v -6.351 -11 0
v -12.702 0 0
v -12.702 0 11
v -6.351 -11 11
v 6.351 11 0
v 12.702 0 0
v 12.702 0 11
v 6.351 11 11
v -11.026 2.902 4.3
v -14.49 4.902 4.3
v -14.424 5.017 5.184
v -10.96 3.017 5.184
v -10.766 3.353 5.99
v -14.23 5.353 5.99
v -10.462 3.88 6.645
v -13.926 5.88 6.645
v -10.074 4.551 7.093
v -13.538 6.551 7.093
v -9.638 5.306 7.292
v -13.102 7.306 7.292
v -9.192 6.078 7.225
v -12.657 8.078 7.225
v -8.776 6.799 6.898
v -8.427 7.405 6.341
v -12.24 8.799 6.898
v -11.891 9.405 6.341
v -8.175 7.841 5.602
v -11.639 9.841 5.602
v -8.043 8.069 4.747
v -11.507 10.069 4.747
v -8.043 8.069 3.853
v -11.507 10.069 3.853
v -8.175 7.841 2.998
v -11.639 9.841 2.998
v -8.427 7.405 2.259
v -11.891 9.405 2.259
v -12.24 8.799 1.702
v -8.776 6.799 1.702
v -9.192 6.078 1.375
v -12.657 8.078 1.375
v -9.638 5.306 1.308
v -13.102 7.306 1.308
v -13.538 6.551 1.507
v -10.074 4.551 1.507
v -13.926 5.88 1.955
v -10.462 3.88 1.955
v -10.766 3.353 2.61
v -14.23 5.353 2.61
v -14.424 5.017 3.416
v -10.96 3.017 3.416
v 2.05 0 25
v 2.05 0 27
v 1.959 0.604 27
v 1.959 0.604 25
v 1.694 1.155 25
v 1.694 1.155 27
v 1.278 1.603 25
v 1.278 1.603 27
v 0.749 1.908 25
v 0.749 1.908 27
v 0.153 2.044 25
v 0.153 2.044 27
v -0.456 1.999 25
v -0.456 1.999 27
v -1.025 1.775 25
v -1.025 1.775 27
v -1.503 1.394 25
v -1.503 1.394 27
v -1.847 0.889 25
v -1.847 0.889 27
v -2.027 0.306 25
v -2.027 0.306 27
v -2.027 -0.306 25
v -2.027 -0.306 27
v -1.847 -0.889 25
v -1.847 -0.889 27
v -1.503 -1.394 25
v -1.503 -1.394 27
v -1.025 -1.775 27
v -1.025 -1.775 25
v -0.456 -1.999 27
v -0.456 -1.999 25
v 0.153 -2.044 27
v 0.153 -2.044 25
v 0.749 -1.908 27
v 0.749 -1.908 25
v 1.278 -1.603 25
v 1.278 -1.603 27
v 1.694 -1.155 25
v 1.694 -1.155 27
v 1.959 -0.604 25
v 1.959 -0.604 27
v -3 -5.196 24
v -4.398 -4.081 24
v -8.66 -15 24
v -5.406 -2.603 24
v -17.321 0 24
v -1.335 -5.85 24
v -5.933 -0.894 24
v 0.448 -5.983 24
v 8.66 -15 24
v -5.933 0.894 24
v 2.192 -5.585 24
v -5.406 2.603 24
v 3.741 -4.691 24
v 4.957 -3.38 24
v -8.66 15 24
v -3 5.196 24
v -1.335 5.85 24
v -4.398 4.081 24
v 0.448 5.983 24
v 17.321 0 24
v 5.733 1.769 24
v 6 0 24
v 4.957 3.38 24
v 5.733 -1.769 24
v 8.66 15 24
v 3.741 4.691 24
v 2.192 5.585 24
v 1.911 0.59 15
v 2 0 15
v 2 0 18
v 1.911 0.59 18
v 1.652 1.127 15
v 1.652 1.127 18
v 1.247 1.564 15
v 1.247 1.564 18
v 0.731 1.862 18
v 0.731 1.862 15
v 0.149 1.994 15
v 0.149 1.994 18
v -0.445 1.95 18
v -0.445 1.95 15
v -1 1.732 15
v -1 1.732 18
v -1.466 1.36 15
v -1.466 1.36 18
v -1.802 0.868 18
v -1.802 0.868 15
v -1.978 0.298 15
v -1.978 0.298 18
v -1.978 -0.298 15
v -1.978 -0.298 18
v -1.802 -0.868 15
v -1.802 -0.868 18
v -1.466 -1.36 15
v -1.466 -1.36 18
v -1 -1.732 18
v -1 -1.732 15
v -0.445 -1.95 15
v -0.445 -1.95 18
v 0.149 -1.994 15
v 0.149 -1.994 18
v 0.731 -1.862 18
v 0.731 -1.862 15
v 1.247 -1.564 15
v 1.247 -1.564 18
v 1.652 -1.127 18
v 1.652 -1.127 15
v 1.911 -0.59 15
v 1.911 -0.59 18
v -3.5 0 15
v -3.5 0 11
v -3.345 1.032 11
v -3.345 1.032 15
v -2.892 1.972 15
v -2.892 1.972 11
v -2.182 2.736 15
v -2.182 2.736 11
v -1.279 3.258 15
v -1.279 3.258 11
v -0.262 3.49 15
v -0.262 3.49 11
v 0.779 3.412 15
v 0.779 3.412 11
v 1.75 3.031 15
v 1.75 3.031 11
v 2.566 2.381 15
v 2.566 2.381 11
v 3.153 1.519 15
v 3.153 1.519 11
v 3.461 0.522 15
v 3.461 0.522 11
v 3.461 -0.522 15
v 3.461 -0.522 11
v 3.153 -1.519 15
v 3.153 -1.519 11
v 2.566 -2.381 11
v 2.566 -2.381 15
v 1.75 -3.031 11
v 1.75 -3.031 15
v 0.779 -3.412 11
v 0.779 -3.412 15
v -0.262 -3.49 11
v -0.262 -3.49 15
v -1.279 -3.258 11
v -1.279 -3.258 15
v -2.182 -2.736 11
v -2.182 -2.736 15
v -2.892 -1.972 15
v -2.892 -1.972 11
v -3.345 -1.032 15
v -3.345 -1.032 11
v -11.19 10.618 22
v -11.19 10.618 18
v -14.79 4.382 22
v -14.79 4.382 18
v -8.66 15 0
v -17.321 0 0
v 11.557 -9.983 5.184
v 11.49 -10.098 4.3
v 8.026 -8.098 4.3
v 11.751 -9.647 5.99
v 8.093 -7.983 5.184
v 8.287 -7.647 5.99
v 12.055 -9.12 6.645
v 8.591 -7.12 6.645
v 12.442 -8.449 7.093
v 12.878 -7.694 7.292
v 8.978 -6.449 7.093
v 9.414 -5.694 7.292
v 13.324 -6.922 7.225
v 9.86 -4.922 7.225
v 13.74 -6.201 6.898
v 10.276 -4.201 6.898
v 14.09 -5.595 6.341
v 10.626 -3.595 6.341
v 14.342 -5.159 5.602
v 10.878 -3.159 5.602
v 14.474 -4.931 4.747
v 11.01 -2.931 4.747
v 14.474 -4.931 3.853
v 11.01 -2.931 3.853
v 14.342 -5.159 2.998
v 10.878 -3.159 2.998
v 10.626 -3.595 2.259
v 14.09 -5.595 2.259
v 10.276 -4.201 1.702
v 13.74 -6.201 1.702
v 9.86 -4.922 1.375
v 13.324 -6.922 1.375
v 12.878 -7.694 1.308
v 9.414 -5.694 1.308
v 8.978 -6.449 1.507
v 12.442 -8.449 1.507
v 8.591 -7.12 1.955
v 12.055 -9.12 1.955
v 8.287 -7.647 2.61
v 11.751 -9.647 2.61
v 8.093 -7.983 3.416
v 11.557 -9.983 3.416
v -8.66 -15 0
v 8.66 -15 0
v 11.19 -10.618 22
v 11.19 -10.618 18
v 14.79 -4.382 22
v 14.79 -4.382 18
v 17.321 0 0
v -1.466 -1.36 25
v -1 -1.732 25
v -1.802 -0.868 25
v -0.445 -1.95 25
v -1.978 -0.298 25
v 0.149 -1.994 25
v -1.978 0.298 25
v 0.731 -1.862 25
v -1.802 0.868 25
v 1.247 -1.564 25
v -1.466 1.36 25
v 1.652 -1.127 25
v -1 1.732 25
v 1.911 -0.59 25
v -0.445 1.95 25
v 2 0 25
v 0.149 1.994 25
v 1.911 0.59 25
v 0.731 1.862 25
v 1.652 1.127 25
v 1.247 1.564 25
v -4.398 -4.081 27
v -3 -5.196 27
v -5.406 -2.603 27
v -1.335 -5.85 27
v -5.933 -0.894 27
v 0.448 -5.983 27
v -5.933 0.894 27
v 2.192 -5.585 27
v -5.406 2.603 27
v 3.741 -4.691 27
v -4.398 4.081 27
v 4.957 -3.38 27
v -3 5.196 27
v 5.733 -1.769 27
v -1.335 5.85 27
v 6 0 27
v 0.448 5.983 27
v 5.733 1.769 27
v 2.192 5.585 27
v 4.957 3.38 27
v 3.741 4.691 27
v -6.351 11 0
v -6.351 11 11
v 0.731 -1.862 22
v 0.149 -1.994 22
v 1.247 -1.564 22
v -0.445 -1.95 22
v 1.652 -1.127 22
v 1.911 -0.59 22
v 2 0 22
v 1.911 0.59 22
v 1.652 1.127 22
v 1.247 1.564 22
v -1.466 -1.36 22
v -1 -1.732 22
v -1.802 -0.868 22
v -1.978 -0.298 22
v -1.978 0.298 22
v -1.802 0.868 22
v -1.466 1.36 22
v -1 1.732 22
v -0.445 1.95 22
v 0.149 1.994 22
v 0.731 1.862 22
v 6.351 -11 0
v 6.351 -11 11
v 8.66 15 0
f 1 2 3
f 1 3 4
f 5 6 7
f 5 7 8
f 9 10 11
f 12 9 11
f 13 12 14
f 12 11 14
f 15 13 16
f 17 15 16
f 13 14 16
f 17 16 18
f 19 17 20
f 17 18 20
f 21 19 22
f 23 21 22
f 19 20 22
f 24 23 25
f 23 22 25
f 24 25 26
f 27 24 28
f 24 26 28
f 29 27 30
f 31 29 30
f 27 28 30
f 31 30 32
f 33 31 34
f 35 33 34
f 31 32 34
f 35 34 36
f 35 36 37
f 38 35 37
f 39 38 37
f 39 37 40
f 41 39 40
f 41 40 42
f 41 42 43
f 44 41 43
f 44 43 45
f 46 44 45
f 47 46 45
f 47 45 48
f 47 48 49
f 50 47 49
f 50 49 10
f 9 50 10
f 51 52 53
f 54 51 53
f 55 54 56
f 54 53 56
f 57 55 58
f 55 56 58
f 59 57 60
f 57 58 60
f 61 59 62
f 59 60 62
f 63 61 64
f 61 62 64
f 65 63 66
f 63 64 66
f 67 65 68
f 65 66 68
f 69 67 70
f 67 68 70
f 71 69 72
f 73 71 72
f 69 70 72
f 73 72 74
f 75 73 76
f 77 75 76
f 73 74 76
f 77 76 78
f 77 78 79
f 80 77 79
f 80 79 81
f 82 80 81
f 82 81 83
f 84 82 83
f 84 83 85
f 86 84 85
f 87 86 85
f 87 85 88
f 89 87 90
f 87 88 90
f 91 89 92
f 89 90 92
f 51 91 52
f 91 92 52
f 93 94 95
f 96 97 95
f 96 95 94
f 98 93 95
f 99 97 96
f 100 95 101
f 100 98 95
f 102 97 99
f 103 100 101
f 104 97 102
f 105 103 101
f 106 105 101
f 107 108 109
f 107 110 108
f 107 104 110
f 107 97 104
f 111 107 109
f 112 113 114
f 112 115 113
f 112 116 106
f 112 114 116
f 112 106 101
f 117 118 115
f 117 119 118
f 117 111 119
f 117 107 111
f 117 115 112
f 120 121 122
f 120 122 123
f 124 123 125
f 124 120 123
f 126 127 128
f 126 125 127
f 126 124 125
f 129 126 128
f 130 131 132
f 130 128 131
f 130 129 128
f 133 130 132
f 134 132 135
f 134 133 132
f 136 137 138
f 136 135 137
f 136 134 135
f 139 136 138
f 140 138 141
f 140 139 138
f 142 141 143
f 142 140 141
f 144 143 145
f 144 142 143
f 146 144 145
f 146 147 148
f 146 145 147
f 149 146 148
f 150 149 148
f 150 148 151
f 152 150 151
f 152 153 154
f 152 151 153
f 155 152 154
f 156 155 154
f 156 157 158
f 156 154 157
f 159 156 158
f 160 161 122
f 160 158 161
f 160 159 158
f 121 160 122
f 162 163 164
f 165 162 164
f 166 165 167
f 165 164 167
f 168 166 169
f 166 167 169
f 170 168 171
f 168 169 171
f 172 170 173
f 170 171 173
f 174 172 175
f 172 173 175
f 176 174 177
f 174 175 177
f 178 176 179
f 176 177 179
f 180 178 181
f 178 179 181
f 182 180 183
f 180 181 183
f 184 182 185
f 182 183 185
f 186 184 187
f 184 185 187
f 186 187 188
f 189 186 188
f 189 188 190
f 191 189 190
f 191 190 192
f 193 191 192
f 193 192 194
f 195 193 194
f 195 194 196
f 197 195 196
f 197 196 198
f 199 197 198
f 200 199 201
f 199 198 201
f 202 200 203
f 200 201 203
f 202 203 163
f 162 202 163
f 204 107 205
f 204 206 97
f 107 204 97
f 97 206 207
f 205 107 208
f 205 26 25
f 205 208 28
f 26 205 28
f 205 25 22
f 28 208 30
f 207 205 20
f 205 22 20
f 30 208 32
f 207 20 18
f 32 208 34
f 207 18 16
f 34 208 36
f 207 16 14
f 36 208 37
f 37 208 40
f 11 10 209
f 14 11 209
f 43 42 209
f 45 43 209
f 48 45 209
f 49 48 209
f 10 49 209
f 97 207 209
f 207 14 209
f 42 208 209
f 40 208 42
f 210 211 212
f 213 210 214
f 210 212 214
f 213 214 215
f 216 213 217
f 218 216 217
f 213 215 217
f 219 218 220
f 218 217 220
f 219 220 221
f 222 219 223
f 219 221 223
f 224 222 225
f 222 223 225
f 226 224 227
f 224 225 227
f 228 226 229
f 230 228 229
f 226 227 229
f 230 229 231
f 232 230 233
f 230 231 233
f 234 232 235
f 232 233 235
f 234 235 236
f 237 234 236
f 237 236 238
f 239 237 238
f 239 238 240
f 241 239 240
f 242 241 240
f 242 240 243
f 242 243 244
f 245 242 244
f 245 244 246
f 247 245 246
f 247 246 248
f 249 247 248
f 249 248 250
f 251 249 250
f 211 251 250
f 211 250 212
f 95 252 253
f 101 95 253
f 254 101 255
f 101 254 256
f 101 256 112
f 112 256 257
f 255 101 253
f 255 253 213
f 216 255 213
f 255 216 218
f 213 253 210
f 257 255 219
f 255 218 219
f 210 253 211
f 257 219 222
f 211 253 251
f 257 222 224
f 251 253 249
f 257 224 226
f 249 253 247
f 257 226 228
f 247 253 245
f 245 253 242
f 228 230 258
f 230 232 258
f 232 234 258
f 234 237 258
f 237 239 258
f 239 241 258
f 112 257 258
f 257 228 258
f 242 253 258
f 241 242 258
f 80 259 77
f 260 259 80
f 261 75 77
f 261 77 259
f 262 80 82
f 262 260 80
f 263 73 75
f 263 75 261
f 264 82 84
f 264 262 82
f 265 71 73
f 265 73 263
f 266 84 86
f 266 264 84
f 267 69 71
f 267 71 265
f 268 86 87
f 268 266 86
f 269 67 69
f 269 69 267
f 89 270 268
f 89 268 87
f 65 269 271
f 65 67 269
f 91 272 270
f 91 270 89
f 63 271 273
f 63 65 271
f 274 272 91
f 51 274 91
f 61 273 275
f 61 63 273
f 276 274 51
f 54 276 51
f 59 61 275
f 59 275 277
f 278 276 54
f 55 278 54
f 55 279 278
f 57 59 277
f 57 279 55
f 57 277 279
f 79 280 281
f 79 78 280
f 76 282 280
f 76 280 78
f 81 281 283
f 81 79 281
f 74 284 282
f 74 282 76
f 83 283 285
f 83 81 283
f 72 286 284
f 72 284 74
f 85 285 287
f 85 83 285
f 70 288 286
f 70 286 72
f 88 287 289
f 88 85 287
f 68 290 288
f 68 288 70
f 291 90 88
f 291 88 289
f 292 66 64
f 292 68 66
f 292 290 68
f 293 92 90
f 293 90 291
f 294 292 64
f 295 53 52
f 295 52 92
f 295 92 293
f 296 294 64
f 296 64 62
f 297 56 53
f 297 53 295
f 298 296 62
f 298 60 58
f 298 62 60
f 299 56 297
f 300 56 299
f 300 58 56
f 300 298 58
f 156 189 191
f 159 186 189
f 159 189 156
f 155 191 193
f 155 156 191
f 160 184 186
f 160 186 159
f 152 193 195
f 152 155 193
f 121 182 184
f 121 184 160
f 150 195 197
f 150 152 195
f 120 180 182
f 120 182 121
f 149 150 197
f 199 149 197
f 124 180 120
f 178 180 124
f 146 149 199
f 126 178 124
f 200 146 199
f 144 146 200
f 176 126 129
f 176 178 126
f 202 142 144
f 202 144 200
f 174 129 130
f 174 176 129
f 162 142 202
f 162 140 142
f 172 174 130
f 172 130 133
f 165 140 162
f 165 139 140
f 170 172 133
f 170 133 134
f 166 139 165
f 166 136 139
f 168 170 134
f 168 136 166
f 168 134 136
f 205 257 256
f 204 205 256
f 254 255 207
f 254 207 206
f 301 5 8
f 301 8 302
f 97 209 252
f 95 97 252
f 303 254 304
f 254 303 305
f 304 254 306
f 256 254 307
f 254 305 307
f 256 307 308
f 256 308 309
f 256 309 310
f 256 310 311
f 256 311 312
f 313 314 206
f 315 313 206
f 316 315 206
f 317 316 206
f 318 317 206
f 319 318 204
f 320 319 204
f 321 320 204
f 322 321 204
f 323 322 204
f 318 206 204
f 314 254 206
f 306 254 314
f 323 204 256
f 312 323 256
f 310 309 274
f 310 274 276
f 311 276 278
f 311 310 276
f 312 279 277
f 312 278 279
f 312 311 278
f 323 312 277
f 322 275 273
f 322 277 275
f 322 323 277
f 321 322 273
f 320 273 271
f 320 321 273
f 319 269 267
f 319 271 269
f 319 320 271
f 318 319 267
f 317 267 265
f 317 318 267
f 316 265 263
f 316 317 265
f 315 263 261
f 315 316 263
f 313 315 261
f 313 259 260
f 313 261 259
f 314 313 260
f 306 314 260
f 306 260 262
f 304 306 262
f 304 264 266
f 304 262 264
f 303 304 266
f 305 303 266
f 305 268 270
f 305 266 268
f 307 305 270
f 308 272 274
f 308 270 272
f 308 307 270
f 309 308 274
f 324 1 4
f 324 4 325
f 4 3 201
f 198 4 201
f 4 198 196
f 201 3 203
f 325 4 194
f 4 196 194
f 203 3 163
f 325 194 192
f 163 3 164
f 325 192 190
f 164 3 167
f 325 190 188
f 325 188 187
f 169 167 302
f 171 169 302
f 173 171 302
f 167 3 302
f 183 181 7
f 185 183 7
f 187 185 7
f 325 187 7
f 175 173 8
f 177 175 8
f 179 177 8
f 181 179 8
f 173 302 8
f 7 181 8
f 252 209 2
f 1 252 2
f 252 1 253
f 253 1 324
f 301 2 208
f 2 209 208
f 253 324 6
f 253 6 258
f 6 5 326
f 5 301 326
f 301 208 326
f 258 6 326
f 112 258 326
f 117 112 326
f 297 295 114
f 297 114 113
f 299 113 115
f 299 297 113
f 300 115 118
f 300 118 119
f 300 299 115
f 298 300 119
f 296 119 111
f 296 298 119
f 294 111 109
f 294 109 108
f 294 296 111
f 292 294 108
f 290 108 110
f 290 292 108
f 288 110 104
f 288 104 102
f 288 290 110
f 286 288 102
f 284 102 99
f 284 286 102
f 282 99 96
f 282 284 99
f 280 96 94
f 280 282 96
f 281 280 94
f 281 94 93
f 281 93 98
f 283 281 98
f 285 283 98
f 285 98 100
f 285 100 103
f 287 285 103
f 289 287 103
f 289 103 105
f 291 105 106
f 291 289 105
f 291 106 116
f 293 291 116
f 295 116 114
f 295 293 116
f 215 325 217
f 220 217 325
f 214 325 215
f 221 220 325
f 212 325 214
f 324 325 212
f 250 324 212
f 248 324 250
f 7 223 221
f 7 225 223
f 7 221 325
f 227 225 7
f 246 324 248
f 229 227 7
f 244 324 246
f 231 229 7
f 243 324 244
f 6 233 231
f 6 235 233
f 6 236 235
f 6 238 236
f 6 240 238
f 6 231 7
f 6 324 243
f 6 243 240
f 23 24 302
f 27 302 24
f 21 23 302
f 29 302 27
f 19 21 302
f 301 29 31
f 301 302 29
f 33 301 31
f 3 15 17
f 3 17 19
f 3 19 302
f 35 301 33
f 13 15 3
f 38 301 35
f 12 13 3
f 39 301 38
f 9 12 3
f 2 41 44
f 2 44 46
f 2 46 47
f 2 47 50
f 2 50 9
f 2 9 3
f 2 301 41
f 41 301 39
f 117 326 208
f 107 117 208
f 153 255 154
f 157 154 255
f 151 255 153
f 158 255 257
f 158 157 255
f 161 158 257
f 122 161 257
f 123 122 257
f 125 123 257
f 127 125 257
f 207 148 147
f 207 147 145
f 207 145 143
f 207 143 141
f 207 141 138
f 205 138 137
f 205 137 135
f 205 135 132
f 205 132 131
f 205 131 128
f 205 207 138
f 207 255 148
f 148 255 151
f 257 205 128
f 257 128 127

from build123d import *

# Parameters (mm, degrees)
SALIENTE_EXTRUIR1_DEPTH = 11
CROQUIS2_R              = 2
SALIENTE_EXTRUIR3_DEPTH = 16
CROQUIS3_R              = 2.05
CORTAR_EXTRUIR1_DEPTH   = 2
CROQUIS4_R              = 3.5
CORTAR_EXTRUIR2_DEPTH   = 4
CROQUIS5_W              = 4
CROQUIS5_H              = 7.2
CORTAR_EXTRUIR3_DEPTH   = 47.411205543
CROQUIS6_R              = 3
CORTAR_EXTRUIR4_DEPTH   = 47.411205543
CROQUIS7_R              = 6
CORTAR_EXTRUIR5_DEPTH   = 3


with BuildPart() as part:
    # Croquis1 → Saliente-Extruir1 (new body)
    with BuildSketch(Plane.XY):
        Polygon((17.320508076, 0), (8.660254038, 15), (-8.660254038, 15), (-17.320508076, 0), (-8.660254038, -15), (8.660254038, -15), align=None)
        Polygon((12.701705922, 0), (6.350852961, 11), (-6.350852961, 11), (-12.701705922, 0), (-6.350852961, -11), (6.350852961, -11), align=None, mode=Mode.SUBTRACT)
    extrude(amount=SALIENTE_EXTRUIR1_DEPTH)

    # Croquis2 → Saliente-Extruir3 (add)
    with BuildSketch(Plane.XY.offset(11)):
        Polygon((-8.660254038, 15), (-17.320508076, 0), (-8.660254038, -15), (8.660254038, -15), (17.320508076, 0), (8.660254038, 15), align=None)
        Circle(CROQUIS2_R, mode=Mode.SUBTRACT)
    extrude(amount=SALIENTE_EXTRUIR3_DEPTH)

    # Croquis3 → Cortar-Extruir1 (cut)
    with BuildSketch(Plane.XY.offset(27)):
        Circle(CROQUIS3_R)
    extrude(amount=-CORTAR_EXTRUIR1_DEPTH, mode=Mode.SUBTRACT)

    # Croquis4 → Cortar-Extruir2 (cut)
    with BuildSketch(Plane(origin=(0, 0, 11), x_dir=(-1, 0, 0), z_dir=(0, 0, -1))):
        Circle(CROQUIS4_R)
    extrude(amount=-CORTAR_EXTRUIR2_DEPTH, mode=Mode.SUBTRACT)

    # Croquis5 → Cortar-Extruir3 (cut, through all)
    with BuildSketch(Plane(origin=(-12.990381057, 7.5, 0), x_dir=(0, 0, 1), z_dir=(-0.8660254037844386, 0.5, 0))):
        with Locations((20, 0)):
            Rectangle(CROQUIS5_W, CROQUIS5_H)
    extrude(amount=-CORTAR_EXTRUIR3_DEPTH, mode=Mode.SUBTRACT)

    # Croquis6 → Cortar-Extruir4 (cut, through all)
    with BuildSketch(Plane(origin=(-12.990381057, 7.5, 0), x_dir=(0, 0, 1), z_dir=(-0.8660254037844386, 0.5, 0))):
        with Locations(Location((4.3, 0, 0), (0, 0, 270))):
            Circle(CROQUIS6_R)
    extrude(amount=-CORTAR_EXTRUIR4_DEPTH, mode=Mode.SUBTRACT)

    # Croquis7 → Cortar-Extruir5 (cut)
    with BuildSketch(Plane.XY.offset(27)):
        Polygon((-8.660254038, 15), (-17.320508076, 0), (-8.660254038, -15), (8.660254038, -15), (17.320508076, 0), (8.660254038, 15), align=None)
        Circle(CROQUIS7_R, mode=Mode.SUBTRACT)
    extrude(amount=-CORTAR_EXTRUIR5_DEPTH, mode=Mode.SUBTRACT)


solid = part.part
